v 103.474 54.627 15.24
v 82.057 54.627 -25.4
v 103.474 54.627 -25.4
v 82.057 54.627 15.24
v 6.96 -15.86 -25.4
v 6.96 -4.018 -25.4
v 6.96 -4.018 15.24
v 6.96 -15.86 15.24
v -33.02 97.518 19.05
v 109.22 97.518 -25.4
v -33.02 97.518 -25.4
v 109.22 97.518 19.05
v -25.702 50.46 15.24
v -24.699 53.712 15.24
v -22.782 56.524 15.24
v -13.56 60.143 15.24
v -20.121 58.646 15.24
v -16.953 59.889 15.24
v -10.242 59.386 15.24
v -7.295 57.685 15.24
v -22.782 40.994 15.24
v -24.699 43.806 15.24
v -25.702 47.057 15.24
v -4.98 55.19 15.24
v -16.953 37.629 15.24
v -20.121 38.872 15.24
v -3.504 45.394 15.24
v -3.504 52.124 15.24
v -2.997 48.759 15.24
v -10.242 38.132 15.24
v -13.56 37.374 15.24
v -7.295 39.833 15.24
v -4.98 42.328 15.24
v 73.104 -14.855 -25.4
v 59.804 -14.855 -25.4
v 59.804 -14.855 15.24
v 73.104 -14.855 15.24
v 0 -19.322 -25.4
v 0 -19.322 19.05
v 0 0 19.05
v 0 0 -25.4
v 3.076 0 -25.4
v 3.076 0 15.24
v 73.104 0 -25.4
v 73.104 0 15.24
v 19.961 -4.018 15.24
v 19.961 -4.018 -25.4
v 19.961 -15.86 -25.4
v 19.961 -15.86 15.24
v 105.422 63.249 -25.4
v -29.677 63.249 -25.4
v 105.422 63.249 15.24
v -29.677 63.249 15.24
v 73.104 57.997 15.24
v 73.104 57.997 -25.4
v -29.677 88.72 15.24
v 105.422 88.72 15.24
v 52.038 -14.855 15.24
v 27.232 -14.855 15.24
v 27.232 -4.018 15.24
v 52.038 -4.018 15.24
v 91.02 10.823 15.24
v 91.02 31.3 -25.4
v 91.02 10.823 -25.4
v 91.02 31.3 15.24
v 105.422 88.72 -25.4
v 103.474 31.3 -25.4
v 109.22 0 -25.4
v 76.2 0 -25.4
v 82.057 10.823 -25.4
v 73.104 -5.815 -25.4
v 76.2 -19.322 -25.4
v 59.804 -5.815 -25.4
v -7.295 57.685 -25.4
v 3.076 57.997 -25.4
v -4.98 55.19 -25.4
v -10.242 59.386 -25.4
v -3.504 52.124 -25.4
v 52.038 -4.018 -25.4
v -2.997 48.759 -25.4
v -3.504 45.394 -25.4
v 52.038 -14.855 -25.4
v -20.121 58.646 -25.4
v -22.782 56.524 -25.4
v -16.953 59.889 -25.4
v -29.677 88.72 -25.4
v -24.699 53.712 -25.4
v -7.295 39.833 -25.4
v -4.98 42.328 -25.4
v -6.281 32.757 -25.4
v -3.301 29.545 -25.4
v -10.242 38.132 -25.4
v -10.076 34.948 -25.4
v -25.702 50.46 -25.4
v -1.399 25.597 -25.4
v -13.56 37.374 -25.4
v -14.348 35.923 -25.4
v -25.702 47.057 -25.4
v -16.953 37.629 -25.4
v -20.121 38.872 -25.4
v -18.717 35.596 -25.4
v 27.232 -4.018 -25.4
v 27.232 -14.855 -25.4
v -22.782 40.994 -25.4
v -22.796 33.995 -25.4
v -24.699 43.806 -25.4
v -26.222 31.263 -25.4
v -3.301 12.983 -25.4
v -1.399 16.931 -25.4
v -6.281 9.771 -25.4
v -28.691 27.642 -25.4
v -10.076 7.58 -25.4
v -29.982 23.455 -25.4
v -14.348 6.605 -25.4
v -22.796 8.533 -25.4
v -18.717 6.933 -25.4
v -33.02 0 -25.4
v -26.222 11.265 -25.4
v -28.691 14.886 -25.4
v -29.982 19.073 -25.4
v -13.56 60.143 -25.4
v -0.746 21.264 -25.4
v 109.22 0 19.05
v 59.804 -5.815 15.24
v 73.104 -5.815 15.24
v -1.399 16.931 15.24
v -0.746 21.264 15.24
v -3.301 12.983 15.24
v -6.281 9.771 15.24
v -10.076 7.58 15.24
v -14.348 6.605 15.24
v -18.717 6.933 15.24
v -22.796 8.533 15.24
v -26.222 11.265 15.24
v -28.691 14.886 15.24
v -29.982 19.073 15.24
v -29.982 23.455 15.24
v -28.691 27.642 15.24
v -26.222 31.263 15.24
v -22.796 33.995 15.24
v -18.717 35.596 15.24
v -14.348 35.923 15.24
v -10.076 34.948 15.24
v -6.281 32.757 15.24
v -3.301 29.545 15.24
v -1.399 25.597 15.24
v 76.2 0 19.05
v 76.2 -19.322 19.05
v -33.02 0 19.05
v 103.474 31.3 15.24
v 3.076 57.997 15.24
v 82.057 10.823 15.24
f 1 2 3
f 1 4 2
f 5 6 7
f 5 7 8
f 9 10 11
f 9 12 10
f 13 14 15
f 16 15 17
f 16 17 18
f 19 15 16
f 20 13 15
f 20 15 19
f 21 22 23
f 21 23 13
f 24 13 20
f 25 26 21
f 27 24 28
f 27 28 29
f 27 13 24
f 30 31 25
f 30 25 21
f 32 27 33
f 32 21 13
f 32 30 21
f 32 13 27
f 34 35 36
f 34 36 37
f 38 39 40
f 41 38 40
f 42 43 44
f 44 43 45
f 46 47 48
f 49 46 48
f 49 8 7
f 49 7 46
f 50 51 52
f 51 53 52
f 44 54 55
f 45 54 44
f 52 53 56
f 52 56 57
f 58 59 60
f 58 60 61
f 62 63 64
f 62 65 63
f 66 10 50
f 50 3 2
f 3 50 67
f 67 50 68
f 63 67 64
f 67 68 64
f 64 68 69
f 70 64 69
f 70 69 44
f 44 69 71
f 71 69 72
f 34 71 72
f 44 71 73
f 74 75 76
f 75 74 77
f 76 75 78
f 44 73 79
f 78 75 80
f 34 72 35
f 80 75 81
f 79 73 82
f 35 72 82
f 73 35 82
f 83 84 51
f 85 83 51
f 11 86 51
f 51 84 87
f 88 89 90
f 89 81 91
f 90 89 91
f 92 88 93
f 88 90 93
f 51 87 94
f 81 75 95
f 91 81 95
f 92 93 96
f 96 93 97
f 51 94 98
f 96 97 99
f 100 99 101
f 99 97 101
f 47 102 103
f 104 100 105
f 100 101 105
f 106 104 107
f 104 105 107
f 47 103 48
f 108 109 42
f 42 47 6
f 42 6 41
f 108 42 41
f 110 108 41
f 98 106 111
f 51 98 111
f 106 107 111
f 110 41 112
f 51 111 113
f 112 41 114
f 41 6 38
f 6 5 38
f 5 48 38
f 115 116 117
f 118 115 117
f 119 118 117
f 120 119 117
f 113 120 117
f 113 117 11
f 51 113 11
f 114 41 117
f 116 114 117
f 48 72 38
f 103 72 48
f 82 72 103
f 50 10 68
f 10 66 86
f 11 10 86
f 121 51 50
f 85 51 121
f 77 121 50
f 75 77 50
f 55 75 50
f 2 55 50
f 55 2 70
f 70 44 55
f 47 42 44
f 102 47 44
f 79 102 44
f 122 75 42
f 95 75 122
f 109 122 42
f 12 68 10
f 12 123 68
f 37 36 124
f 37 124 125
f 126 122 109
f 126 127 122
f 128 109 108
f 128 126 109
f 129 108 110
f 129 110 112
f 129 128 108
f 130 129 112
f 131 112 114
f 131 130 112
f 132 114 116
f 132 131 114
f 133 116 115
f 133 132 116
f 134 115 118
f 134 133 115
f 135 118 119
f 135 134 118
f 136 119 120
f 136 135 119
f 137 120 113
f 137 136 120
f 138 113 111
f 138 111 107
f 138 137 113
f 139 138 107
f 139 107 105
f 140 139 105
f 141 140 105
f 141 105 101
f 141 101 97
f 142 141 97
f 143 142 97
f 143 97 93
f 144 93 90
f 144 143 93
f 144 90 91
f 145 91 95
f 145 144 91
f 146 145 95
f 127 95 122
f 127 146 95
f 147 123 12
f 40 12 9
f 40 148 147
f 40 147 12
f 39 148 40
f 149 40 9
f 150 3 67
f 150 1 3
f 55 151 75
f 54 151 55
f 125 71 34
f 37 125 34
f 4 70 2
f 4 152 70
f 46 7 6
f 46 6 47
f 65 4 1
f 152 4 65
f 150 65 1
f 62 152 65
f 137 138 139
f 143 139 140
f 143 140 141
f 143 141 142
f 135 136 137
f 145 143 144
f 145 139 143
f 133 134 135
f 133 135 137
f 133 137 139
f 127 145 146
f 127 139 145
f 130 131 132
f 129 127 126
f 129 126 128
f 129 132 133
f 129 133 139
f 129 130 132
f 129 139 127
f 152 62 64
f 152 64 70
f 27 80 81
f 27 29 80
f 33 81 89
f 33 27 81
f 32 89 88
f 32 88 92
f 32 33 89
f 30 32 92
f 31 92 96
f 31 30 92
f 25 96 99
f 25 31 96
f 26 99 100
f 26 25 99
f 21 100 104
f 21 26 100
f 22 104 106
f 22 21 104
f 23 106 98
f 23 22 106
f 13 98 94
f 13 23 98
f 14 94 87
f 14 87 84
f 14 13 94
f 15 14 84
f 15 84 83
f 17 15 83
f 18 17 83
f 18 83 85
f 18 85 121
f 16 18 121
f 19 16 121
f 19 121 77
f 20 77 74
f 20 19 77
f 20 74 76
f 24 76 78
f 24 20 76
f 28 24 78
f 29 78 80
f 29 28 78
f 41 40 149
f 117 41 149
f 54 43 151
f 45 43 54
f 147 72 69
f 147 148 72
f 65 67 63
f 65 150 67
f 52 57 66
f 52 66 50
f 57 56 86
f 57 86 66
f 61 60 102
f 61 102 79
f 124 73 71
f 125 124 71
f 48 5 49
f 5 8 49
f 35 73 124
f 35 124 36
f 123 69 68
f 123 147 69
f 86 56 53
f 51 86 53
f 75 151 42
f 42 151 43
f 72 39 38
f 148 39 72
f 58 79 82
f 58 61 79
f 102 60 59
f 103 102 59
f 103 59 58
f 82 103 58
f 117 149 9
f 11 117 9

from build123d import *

# Parameters (mm, degrees)
F0_W      = 76.2002236371
F0_H      = 83.8200002909
F1_DEPTH  = 19.05
F2_W      = 70.0279923622
F2_H      = 57.9973980784
F3_DEPTH  = 15.24
F4_W      = 13.0012880329
F4_H      = 11.8417413905
F5_DEPTH  = 15.24
F6_W      = 24.8060952872
F6_H      = 10.8370622396
F7_DEPTH  = 15.24
F8_W      = 13.2993943989
F8_H      = 9.0398679234
F9_DEPTH  = 15.24
F10_W     = 64.4978582859
F10_H     = 19.05
F11_DEPTH = 33.02
F12_W     = 64.4978582859
F12_H     = 19.05
F13_DEPTH = 33.02
F14_W     = 142.2402236371
F14_H     = 19.05
F15_DEPTH = 33.02
F16_W     = 135.098611936
F16_H     = 25.4710018635
F17_DEPTH = 15.24
F18_R     = 14.7000934616
F19_DEPTH = 15.24
F20_R     = 11.4164159858
F21_DEPTH = 15.24
F23_DEPTH = 15.24
F24_DEPTH = 25.4


with BuildPart() as f1:
    # F0 (on Top) → F1 (new body)
    with BuildSketch(Plane.XY):
        with Locations((38.1001118185, 22.5878581405)):
            Rectangle(F0_W, F0_H)
    extrude(amount=F1_DEPTH)

    # F2 (on face) → F3 (cut)
    with BuildSketch(Plane(origin=(0, 0, 0), x_dir=(1, 0, 0), z_dir=(0, 0, -1))):
        with Locations((38.089536014, -28.9986990392)):
            Rectangle(F2_W, F2_H)
    extrude(amount=-F3_DEPTH, mode=Mode.SUBTRACT)

    # F4 (on face) → F5 (cut)
    with BuildSketch(Plane(origin=(0, 0, 0), x_dir=(1, 0, 0), z_dir=(0, 0, -1))):
        with Locations((13.4606149513, 9.9389031529)):
            Rectangle(F4_W, F4_H)
    extrude(amount=-F5_DEPTH, mode=Mode.SUBTRACT)

    # F6 (on face) → F7 (cut)
    with BuildSketch(Plane(origin=(0, 0, 0), x_dir=(1, 0, 0), z_dir=(0, 0, -1))):
        with Locations((39.6352009848, 9.4365635775)):
            Rectangle(F6_W, F6_H)
    extrude(amount=-F7_DEPTH, mode=Mode.SUBTRACT)

    # F8 (on face) → F9 (cut)
    with BuildSketch(Plane(origin=(0, 0, 0), x_dir=(1, 0, 0), z_dir=(0, 0, -1))):
        with Locations((66.4538349956, 10.3351607356)):
            Rectangle(F8_W, F8_H)
    extrude(amount=-F9_DEPTH, mode=Mode.SUBTRACT)

    # F10 (on face) → F11 (join)
    with BuildSketch(Plane.YZ.offset(76.2002236371)):
        with Locations((32.248929143, 9.525)):
            Rectangle(F10_W, F10_H)
    extrude(amount=F11_DEPTH)

    # F12 (on face) → F13 (join)
    with BuildSketch(Plane(origin=(0, 0, 0), x_dir=(0, -1, 0), z_dir=(-1, 0, 0))):
        with Locations((-32.248929143, 9.525)):
            Rectangle(F12_W, F12_H)
    extrude(amount=F13_DEPTH)

    # F14 (on face) → F15 (join)
    with BuildSketch(Plane(origin=(0, 64.4978582859, 0), x_dir=(-1, 0, 0), z_dir=(0, 1, 0))):
        with Locations((-38.1001118185, 9.525)):
            Rectangle(F14_W, F14_H)
    extrude(amount=F15_DEPTH)

    # F16 (on face) → F17 (cut)
    with BuildSketch(Plane(origin=(0, 0, 0), x_dir=(1, 0, 0), z_dir=(0, 0, -1))):
        with Locations((37.8726990893, -75.9849250317)):
            Rectangle(F16_W, F16_H)
    extrude(amount=-F17_DEPTH, mode=Mode.SUBTRACT)

    # F18 (on face) → F19 (cut)
    with BuildSketch(Plane(origin=(0, 0, 0), x_dir=(1, 0, 0), z_dir=(0, 0, -1))):
        with Locations((-15.4463164508, -21.2640985847)):
            Circle(F18_R)
    extrude(amount=-F19_DEPTH, mode=Mode.SUBTRACT)

    # F20 (on face) → F21 (cut)
    with BuildSketch(Plane(origin=(0, 0, 0), x_dir=(1, 0, 0), z_dir=(0, 0, -1))):
        with Locations((-14.4130205736, -48.758929143)):
            Circle(F20_R)
    extrude(amount=-F21_DEPTH, mode=Mode.SUBTRACT)

    # F22 (on face) → F23 (cut)
    with BuildSketch(Plane(origin=(0, 0, 0), x_dir=(1, 0, 0), z_dir=(0, 0, -1))):
        Polygon((91.0199095375, -10.8233336359), (82.0573866367, -10.8233336359), (82.0573866367, -54.6272806823), (103.4740805626, -54.6272806823), (103.4740805626, -31.2997968867), (91.0199095375, -31.2997968867), align=None)
    extrude(amount=-F23_DEPTH, mode=Mode.SUBTRACT)

    # F24 (add): a face of the model
    f24_faces = [f1.faces().sort_by_distance(p)[0] for p in [
        (74.3594665405, -9.6610710025, 0),
    ]]
    extrude(f24_faces, amount=F24_DEPTH)


solid = f1.part
